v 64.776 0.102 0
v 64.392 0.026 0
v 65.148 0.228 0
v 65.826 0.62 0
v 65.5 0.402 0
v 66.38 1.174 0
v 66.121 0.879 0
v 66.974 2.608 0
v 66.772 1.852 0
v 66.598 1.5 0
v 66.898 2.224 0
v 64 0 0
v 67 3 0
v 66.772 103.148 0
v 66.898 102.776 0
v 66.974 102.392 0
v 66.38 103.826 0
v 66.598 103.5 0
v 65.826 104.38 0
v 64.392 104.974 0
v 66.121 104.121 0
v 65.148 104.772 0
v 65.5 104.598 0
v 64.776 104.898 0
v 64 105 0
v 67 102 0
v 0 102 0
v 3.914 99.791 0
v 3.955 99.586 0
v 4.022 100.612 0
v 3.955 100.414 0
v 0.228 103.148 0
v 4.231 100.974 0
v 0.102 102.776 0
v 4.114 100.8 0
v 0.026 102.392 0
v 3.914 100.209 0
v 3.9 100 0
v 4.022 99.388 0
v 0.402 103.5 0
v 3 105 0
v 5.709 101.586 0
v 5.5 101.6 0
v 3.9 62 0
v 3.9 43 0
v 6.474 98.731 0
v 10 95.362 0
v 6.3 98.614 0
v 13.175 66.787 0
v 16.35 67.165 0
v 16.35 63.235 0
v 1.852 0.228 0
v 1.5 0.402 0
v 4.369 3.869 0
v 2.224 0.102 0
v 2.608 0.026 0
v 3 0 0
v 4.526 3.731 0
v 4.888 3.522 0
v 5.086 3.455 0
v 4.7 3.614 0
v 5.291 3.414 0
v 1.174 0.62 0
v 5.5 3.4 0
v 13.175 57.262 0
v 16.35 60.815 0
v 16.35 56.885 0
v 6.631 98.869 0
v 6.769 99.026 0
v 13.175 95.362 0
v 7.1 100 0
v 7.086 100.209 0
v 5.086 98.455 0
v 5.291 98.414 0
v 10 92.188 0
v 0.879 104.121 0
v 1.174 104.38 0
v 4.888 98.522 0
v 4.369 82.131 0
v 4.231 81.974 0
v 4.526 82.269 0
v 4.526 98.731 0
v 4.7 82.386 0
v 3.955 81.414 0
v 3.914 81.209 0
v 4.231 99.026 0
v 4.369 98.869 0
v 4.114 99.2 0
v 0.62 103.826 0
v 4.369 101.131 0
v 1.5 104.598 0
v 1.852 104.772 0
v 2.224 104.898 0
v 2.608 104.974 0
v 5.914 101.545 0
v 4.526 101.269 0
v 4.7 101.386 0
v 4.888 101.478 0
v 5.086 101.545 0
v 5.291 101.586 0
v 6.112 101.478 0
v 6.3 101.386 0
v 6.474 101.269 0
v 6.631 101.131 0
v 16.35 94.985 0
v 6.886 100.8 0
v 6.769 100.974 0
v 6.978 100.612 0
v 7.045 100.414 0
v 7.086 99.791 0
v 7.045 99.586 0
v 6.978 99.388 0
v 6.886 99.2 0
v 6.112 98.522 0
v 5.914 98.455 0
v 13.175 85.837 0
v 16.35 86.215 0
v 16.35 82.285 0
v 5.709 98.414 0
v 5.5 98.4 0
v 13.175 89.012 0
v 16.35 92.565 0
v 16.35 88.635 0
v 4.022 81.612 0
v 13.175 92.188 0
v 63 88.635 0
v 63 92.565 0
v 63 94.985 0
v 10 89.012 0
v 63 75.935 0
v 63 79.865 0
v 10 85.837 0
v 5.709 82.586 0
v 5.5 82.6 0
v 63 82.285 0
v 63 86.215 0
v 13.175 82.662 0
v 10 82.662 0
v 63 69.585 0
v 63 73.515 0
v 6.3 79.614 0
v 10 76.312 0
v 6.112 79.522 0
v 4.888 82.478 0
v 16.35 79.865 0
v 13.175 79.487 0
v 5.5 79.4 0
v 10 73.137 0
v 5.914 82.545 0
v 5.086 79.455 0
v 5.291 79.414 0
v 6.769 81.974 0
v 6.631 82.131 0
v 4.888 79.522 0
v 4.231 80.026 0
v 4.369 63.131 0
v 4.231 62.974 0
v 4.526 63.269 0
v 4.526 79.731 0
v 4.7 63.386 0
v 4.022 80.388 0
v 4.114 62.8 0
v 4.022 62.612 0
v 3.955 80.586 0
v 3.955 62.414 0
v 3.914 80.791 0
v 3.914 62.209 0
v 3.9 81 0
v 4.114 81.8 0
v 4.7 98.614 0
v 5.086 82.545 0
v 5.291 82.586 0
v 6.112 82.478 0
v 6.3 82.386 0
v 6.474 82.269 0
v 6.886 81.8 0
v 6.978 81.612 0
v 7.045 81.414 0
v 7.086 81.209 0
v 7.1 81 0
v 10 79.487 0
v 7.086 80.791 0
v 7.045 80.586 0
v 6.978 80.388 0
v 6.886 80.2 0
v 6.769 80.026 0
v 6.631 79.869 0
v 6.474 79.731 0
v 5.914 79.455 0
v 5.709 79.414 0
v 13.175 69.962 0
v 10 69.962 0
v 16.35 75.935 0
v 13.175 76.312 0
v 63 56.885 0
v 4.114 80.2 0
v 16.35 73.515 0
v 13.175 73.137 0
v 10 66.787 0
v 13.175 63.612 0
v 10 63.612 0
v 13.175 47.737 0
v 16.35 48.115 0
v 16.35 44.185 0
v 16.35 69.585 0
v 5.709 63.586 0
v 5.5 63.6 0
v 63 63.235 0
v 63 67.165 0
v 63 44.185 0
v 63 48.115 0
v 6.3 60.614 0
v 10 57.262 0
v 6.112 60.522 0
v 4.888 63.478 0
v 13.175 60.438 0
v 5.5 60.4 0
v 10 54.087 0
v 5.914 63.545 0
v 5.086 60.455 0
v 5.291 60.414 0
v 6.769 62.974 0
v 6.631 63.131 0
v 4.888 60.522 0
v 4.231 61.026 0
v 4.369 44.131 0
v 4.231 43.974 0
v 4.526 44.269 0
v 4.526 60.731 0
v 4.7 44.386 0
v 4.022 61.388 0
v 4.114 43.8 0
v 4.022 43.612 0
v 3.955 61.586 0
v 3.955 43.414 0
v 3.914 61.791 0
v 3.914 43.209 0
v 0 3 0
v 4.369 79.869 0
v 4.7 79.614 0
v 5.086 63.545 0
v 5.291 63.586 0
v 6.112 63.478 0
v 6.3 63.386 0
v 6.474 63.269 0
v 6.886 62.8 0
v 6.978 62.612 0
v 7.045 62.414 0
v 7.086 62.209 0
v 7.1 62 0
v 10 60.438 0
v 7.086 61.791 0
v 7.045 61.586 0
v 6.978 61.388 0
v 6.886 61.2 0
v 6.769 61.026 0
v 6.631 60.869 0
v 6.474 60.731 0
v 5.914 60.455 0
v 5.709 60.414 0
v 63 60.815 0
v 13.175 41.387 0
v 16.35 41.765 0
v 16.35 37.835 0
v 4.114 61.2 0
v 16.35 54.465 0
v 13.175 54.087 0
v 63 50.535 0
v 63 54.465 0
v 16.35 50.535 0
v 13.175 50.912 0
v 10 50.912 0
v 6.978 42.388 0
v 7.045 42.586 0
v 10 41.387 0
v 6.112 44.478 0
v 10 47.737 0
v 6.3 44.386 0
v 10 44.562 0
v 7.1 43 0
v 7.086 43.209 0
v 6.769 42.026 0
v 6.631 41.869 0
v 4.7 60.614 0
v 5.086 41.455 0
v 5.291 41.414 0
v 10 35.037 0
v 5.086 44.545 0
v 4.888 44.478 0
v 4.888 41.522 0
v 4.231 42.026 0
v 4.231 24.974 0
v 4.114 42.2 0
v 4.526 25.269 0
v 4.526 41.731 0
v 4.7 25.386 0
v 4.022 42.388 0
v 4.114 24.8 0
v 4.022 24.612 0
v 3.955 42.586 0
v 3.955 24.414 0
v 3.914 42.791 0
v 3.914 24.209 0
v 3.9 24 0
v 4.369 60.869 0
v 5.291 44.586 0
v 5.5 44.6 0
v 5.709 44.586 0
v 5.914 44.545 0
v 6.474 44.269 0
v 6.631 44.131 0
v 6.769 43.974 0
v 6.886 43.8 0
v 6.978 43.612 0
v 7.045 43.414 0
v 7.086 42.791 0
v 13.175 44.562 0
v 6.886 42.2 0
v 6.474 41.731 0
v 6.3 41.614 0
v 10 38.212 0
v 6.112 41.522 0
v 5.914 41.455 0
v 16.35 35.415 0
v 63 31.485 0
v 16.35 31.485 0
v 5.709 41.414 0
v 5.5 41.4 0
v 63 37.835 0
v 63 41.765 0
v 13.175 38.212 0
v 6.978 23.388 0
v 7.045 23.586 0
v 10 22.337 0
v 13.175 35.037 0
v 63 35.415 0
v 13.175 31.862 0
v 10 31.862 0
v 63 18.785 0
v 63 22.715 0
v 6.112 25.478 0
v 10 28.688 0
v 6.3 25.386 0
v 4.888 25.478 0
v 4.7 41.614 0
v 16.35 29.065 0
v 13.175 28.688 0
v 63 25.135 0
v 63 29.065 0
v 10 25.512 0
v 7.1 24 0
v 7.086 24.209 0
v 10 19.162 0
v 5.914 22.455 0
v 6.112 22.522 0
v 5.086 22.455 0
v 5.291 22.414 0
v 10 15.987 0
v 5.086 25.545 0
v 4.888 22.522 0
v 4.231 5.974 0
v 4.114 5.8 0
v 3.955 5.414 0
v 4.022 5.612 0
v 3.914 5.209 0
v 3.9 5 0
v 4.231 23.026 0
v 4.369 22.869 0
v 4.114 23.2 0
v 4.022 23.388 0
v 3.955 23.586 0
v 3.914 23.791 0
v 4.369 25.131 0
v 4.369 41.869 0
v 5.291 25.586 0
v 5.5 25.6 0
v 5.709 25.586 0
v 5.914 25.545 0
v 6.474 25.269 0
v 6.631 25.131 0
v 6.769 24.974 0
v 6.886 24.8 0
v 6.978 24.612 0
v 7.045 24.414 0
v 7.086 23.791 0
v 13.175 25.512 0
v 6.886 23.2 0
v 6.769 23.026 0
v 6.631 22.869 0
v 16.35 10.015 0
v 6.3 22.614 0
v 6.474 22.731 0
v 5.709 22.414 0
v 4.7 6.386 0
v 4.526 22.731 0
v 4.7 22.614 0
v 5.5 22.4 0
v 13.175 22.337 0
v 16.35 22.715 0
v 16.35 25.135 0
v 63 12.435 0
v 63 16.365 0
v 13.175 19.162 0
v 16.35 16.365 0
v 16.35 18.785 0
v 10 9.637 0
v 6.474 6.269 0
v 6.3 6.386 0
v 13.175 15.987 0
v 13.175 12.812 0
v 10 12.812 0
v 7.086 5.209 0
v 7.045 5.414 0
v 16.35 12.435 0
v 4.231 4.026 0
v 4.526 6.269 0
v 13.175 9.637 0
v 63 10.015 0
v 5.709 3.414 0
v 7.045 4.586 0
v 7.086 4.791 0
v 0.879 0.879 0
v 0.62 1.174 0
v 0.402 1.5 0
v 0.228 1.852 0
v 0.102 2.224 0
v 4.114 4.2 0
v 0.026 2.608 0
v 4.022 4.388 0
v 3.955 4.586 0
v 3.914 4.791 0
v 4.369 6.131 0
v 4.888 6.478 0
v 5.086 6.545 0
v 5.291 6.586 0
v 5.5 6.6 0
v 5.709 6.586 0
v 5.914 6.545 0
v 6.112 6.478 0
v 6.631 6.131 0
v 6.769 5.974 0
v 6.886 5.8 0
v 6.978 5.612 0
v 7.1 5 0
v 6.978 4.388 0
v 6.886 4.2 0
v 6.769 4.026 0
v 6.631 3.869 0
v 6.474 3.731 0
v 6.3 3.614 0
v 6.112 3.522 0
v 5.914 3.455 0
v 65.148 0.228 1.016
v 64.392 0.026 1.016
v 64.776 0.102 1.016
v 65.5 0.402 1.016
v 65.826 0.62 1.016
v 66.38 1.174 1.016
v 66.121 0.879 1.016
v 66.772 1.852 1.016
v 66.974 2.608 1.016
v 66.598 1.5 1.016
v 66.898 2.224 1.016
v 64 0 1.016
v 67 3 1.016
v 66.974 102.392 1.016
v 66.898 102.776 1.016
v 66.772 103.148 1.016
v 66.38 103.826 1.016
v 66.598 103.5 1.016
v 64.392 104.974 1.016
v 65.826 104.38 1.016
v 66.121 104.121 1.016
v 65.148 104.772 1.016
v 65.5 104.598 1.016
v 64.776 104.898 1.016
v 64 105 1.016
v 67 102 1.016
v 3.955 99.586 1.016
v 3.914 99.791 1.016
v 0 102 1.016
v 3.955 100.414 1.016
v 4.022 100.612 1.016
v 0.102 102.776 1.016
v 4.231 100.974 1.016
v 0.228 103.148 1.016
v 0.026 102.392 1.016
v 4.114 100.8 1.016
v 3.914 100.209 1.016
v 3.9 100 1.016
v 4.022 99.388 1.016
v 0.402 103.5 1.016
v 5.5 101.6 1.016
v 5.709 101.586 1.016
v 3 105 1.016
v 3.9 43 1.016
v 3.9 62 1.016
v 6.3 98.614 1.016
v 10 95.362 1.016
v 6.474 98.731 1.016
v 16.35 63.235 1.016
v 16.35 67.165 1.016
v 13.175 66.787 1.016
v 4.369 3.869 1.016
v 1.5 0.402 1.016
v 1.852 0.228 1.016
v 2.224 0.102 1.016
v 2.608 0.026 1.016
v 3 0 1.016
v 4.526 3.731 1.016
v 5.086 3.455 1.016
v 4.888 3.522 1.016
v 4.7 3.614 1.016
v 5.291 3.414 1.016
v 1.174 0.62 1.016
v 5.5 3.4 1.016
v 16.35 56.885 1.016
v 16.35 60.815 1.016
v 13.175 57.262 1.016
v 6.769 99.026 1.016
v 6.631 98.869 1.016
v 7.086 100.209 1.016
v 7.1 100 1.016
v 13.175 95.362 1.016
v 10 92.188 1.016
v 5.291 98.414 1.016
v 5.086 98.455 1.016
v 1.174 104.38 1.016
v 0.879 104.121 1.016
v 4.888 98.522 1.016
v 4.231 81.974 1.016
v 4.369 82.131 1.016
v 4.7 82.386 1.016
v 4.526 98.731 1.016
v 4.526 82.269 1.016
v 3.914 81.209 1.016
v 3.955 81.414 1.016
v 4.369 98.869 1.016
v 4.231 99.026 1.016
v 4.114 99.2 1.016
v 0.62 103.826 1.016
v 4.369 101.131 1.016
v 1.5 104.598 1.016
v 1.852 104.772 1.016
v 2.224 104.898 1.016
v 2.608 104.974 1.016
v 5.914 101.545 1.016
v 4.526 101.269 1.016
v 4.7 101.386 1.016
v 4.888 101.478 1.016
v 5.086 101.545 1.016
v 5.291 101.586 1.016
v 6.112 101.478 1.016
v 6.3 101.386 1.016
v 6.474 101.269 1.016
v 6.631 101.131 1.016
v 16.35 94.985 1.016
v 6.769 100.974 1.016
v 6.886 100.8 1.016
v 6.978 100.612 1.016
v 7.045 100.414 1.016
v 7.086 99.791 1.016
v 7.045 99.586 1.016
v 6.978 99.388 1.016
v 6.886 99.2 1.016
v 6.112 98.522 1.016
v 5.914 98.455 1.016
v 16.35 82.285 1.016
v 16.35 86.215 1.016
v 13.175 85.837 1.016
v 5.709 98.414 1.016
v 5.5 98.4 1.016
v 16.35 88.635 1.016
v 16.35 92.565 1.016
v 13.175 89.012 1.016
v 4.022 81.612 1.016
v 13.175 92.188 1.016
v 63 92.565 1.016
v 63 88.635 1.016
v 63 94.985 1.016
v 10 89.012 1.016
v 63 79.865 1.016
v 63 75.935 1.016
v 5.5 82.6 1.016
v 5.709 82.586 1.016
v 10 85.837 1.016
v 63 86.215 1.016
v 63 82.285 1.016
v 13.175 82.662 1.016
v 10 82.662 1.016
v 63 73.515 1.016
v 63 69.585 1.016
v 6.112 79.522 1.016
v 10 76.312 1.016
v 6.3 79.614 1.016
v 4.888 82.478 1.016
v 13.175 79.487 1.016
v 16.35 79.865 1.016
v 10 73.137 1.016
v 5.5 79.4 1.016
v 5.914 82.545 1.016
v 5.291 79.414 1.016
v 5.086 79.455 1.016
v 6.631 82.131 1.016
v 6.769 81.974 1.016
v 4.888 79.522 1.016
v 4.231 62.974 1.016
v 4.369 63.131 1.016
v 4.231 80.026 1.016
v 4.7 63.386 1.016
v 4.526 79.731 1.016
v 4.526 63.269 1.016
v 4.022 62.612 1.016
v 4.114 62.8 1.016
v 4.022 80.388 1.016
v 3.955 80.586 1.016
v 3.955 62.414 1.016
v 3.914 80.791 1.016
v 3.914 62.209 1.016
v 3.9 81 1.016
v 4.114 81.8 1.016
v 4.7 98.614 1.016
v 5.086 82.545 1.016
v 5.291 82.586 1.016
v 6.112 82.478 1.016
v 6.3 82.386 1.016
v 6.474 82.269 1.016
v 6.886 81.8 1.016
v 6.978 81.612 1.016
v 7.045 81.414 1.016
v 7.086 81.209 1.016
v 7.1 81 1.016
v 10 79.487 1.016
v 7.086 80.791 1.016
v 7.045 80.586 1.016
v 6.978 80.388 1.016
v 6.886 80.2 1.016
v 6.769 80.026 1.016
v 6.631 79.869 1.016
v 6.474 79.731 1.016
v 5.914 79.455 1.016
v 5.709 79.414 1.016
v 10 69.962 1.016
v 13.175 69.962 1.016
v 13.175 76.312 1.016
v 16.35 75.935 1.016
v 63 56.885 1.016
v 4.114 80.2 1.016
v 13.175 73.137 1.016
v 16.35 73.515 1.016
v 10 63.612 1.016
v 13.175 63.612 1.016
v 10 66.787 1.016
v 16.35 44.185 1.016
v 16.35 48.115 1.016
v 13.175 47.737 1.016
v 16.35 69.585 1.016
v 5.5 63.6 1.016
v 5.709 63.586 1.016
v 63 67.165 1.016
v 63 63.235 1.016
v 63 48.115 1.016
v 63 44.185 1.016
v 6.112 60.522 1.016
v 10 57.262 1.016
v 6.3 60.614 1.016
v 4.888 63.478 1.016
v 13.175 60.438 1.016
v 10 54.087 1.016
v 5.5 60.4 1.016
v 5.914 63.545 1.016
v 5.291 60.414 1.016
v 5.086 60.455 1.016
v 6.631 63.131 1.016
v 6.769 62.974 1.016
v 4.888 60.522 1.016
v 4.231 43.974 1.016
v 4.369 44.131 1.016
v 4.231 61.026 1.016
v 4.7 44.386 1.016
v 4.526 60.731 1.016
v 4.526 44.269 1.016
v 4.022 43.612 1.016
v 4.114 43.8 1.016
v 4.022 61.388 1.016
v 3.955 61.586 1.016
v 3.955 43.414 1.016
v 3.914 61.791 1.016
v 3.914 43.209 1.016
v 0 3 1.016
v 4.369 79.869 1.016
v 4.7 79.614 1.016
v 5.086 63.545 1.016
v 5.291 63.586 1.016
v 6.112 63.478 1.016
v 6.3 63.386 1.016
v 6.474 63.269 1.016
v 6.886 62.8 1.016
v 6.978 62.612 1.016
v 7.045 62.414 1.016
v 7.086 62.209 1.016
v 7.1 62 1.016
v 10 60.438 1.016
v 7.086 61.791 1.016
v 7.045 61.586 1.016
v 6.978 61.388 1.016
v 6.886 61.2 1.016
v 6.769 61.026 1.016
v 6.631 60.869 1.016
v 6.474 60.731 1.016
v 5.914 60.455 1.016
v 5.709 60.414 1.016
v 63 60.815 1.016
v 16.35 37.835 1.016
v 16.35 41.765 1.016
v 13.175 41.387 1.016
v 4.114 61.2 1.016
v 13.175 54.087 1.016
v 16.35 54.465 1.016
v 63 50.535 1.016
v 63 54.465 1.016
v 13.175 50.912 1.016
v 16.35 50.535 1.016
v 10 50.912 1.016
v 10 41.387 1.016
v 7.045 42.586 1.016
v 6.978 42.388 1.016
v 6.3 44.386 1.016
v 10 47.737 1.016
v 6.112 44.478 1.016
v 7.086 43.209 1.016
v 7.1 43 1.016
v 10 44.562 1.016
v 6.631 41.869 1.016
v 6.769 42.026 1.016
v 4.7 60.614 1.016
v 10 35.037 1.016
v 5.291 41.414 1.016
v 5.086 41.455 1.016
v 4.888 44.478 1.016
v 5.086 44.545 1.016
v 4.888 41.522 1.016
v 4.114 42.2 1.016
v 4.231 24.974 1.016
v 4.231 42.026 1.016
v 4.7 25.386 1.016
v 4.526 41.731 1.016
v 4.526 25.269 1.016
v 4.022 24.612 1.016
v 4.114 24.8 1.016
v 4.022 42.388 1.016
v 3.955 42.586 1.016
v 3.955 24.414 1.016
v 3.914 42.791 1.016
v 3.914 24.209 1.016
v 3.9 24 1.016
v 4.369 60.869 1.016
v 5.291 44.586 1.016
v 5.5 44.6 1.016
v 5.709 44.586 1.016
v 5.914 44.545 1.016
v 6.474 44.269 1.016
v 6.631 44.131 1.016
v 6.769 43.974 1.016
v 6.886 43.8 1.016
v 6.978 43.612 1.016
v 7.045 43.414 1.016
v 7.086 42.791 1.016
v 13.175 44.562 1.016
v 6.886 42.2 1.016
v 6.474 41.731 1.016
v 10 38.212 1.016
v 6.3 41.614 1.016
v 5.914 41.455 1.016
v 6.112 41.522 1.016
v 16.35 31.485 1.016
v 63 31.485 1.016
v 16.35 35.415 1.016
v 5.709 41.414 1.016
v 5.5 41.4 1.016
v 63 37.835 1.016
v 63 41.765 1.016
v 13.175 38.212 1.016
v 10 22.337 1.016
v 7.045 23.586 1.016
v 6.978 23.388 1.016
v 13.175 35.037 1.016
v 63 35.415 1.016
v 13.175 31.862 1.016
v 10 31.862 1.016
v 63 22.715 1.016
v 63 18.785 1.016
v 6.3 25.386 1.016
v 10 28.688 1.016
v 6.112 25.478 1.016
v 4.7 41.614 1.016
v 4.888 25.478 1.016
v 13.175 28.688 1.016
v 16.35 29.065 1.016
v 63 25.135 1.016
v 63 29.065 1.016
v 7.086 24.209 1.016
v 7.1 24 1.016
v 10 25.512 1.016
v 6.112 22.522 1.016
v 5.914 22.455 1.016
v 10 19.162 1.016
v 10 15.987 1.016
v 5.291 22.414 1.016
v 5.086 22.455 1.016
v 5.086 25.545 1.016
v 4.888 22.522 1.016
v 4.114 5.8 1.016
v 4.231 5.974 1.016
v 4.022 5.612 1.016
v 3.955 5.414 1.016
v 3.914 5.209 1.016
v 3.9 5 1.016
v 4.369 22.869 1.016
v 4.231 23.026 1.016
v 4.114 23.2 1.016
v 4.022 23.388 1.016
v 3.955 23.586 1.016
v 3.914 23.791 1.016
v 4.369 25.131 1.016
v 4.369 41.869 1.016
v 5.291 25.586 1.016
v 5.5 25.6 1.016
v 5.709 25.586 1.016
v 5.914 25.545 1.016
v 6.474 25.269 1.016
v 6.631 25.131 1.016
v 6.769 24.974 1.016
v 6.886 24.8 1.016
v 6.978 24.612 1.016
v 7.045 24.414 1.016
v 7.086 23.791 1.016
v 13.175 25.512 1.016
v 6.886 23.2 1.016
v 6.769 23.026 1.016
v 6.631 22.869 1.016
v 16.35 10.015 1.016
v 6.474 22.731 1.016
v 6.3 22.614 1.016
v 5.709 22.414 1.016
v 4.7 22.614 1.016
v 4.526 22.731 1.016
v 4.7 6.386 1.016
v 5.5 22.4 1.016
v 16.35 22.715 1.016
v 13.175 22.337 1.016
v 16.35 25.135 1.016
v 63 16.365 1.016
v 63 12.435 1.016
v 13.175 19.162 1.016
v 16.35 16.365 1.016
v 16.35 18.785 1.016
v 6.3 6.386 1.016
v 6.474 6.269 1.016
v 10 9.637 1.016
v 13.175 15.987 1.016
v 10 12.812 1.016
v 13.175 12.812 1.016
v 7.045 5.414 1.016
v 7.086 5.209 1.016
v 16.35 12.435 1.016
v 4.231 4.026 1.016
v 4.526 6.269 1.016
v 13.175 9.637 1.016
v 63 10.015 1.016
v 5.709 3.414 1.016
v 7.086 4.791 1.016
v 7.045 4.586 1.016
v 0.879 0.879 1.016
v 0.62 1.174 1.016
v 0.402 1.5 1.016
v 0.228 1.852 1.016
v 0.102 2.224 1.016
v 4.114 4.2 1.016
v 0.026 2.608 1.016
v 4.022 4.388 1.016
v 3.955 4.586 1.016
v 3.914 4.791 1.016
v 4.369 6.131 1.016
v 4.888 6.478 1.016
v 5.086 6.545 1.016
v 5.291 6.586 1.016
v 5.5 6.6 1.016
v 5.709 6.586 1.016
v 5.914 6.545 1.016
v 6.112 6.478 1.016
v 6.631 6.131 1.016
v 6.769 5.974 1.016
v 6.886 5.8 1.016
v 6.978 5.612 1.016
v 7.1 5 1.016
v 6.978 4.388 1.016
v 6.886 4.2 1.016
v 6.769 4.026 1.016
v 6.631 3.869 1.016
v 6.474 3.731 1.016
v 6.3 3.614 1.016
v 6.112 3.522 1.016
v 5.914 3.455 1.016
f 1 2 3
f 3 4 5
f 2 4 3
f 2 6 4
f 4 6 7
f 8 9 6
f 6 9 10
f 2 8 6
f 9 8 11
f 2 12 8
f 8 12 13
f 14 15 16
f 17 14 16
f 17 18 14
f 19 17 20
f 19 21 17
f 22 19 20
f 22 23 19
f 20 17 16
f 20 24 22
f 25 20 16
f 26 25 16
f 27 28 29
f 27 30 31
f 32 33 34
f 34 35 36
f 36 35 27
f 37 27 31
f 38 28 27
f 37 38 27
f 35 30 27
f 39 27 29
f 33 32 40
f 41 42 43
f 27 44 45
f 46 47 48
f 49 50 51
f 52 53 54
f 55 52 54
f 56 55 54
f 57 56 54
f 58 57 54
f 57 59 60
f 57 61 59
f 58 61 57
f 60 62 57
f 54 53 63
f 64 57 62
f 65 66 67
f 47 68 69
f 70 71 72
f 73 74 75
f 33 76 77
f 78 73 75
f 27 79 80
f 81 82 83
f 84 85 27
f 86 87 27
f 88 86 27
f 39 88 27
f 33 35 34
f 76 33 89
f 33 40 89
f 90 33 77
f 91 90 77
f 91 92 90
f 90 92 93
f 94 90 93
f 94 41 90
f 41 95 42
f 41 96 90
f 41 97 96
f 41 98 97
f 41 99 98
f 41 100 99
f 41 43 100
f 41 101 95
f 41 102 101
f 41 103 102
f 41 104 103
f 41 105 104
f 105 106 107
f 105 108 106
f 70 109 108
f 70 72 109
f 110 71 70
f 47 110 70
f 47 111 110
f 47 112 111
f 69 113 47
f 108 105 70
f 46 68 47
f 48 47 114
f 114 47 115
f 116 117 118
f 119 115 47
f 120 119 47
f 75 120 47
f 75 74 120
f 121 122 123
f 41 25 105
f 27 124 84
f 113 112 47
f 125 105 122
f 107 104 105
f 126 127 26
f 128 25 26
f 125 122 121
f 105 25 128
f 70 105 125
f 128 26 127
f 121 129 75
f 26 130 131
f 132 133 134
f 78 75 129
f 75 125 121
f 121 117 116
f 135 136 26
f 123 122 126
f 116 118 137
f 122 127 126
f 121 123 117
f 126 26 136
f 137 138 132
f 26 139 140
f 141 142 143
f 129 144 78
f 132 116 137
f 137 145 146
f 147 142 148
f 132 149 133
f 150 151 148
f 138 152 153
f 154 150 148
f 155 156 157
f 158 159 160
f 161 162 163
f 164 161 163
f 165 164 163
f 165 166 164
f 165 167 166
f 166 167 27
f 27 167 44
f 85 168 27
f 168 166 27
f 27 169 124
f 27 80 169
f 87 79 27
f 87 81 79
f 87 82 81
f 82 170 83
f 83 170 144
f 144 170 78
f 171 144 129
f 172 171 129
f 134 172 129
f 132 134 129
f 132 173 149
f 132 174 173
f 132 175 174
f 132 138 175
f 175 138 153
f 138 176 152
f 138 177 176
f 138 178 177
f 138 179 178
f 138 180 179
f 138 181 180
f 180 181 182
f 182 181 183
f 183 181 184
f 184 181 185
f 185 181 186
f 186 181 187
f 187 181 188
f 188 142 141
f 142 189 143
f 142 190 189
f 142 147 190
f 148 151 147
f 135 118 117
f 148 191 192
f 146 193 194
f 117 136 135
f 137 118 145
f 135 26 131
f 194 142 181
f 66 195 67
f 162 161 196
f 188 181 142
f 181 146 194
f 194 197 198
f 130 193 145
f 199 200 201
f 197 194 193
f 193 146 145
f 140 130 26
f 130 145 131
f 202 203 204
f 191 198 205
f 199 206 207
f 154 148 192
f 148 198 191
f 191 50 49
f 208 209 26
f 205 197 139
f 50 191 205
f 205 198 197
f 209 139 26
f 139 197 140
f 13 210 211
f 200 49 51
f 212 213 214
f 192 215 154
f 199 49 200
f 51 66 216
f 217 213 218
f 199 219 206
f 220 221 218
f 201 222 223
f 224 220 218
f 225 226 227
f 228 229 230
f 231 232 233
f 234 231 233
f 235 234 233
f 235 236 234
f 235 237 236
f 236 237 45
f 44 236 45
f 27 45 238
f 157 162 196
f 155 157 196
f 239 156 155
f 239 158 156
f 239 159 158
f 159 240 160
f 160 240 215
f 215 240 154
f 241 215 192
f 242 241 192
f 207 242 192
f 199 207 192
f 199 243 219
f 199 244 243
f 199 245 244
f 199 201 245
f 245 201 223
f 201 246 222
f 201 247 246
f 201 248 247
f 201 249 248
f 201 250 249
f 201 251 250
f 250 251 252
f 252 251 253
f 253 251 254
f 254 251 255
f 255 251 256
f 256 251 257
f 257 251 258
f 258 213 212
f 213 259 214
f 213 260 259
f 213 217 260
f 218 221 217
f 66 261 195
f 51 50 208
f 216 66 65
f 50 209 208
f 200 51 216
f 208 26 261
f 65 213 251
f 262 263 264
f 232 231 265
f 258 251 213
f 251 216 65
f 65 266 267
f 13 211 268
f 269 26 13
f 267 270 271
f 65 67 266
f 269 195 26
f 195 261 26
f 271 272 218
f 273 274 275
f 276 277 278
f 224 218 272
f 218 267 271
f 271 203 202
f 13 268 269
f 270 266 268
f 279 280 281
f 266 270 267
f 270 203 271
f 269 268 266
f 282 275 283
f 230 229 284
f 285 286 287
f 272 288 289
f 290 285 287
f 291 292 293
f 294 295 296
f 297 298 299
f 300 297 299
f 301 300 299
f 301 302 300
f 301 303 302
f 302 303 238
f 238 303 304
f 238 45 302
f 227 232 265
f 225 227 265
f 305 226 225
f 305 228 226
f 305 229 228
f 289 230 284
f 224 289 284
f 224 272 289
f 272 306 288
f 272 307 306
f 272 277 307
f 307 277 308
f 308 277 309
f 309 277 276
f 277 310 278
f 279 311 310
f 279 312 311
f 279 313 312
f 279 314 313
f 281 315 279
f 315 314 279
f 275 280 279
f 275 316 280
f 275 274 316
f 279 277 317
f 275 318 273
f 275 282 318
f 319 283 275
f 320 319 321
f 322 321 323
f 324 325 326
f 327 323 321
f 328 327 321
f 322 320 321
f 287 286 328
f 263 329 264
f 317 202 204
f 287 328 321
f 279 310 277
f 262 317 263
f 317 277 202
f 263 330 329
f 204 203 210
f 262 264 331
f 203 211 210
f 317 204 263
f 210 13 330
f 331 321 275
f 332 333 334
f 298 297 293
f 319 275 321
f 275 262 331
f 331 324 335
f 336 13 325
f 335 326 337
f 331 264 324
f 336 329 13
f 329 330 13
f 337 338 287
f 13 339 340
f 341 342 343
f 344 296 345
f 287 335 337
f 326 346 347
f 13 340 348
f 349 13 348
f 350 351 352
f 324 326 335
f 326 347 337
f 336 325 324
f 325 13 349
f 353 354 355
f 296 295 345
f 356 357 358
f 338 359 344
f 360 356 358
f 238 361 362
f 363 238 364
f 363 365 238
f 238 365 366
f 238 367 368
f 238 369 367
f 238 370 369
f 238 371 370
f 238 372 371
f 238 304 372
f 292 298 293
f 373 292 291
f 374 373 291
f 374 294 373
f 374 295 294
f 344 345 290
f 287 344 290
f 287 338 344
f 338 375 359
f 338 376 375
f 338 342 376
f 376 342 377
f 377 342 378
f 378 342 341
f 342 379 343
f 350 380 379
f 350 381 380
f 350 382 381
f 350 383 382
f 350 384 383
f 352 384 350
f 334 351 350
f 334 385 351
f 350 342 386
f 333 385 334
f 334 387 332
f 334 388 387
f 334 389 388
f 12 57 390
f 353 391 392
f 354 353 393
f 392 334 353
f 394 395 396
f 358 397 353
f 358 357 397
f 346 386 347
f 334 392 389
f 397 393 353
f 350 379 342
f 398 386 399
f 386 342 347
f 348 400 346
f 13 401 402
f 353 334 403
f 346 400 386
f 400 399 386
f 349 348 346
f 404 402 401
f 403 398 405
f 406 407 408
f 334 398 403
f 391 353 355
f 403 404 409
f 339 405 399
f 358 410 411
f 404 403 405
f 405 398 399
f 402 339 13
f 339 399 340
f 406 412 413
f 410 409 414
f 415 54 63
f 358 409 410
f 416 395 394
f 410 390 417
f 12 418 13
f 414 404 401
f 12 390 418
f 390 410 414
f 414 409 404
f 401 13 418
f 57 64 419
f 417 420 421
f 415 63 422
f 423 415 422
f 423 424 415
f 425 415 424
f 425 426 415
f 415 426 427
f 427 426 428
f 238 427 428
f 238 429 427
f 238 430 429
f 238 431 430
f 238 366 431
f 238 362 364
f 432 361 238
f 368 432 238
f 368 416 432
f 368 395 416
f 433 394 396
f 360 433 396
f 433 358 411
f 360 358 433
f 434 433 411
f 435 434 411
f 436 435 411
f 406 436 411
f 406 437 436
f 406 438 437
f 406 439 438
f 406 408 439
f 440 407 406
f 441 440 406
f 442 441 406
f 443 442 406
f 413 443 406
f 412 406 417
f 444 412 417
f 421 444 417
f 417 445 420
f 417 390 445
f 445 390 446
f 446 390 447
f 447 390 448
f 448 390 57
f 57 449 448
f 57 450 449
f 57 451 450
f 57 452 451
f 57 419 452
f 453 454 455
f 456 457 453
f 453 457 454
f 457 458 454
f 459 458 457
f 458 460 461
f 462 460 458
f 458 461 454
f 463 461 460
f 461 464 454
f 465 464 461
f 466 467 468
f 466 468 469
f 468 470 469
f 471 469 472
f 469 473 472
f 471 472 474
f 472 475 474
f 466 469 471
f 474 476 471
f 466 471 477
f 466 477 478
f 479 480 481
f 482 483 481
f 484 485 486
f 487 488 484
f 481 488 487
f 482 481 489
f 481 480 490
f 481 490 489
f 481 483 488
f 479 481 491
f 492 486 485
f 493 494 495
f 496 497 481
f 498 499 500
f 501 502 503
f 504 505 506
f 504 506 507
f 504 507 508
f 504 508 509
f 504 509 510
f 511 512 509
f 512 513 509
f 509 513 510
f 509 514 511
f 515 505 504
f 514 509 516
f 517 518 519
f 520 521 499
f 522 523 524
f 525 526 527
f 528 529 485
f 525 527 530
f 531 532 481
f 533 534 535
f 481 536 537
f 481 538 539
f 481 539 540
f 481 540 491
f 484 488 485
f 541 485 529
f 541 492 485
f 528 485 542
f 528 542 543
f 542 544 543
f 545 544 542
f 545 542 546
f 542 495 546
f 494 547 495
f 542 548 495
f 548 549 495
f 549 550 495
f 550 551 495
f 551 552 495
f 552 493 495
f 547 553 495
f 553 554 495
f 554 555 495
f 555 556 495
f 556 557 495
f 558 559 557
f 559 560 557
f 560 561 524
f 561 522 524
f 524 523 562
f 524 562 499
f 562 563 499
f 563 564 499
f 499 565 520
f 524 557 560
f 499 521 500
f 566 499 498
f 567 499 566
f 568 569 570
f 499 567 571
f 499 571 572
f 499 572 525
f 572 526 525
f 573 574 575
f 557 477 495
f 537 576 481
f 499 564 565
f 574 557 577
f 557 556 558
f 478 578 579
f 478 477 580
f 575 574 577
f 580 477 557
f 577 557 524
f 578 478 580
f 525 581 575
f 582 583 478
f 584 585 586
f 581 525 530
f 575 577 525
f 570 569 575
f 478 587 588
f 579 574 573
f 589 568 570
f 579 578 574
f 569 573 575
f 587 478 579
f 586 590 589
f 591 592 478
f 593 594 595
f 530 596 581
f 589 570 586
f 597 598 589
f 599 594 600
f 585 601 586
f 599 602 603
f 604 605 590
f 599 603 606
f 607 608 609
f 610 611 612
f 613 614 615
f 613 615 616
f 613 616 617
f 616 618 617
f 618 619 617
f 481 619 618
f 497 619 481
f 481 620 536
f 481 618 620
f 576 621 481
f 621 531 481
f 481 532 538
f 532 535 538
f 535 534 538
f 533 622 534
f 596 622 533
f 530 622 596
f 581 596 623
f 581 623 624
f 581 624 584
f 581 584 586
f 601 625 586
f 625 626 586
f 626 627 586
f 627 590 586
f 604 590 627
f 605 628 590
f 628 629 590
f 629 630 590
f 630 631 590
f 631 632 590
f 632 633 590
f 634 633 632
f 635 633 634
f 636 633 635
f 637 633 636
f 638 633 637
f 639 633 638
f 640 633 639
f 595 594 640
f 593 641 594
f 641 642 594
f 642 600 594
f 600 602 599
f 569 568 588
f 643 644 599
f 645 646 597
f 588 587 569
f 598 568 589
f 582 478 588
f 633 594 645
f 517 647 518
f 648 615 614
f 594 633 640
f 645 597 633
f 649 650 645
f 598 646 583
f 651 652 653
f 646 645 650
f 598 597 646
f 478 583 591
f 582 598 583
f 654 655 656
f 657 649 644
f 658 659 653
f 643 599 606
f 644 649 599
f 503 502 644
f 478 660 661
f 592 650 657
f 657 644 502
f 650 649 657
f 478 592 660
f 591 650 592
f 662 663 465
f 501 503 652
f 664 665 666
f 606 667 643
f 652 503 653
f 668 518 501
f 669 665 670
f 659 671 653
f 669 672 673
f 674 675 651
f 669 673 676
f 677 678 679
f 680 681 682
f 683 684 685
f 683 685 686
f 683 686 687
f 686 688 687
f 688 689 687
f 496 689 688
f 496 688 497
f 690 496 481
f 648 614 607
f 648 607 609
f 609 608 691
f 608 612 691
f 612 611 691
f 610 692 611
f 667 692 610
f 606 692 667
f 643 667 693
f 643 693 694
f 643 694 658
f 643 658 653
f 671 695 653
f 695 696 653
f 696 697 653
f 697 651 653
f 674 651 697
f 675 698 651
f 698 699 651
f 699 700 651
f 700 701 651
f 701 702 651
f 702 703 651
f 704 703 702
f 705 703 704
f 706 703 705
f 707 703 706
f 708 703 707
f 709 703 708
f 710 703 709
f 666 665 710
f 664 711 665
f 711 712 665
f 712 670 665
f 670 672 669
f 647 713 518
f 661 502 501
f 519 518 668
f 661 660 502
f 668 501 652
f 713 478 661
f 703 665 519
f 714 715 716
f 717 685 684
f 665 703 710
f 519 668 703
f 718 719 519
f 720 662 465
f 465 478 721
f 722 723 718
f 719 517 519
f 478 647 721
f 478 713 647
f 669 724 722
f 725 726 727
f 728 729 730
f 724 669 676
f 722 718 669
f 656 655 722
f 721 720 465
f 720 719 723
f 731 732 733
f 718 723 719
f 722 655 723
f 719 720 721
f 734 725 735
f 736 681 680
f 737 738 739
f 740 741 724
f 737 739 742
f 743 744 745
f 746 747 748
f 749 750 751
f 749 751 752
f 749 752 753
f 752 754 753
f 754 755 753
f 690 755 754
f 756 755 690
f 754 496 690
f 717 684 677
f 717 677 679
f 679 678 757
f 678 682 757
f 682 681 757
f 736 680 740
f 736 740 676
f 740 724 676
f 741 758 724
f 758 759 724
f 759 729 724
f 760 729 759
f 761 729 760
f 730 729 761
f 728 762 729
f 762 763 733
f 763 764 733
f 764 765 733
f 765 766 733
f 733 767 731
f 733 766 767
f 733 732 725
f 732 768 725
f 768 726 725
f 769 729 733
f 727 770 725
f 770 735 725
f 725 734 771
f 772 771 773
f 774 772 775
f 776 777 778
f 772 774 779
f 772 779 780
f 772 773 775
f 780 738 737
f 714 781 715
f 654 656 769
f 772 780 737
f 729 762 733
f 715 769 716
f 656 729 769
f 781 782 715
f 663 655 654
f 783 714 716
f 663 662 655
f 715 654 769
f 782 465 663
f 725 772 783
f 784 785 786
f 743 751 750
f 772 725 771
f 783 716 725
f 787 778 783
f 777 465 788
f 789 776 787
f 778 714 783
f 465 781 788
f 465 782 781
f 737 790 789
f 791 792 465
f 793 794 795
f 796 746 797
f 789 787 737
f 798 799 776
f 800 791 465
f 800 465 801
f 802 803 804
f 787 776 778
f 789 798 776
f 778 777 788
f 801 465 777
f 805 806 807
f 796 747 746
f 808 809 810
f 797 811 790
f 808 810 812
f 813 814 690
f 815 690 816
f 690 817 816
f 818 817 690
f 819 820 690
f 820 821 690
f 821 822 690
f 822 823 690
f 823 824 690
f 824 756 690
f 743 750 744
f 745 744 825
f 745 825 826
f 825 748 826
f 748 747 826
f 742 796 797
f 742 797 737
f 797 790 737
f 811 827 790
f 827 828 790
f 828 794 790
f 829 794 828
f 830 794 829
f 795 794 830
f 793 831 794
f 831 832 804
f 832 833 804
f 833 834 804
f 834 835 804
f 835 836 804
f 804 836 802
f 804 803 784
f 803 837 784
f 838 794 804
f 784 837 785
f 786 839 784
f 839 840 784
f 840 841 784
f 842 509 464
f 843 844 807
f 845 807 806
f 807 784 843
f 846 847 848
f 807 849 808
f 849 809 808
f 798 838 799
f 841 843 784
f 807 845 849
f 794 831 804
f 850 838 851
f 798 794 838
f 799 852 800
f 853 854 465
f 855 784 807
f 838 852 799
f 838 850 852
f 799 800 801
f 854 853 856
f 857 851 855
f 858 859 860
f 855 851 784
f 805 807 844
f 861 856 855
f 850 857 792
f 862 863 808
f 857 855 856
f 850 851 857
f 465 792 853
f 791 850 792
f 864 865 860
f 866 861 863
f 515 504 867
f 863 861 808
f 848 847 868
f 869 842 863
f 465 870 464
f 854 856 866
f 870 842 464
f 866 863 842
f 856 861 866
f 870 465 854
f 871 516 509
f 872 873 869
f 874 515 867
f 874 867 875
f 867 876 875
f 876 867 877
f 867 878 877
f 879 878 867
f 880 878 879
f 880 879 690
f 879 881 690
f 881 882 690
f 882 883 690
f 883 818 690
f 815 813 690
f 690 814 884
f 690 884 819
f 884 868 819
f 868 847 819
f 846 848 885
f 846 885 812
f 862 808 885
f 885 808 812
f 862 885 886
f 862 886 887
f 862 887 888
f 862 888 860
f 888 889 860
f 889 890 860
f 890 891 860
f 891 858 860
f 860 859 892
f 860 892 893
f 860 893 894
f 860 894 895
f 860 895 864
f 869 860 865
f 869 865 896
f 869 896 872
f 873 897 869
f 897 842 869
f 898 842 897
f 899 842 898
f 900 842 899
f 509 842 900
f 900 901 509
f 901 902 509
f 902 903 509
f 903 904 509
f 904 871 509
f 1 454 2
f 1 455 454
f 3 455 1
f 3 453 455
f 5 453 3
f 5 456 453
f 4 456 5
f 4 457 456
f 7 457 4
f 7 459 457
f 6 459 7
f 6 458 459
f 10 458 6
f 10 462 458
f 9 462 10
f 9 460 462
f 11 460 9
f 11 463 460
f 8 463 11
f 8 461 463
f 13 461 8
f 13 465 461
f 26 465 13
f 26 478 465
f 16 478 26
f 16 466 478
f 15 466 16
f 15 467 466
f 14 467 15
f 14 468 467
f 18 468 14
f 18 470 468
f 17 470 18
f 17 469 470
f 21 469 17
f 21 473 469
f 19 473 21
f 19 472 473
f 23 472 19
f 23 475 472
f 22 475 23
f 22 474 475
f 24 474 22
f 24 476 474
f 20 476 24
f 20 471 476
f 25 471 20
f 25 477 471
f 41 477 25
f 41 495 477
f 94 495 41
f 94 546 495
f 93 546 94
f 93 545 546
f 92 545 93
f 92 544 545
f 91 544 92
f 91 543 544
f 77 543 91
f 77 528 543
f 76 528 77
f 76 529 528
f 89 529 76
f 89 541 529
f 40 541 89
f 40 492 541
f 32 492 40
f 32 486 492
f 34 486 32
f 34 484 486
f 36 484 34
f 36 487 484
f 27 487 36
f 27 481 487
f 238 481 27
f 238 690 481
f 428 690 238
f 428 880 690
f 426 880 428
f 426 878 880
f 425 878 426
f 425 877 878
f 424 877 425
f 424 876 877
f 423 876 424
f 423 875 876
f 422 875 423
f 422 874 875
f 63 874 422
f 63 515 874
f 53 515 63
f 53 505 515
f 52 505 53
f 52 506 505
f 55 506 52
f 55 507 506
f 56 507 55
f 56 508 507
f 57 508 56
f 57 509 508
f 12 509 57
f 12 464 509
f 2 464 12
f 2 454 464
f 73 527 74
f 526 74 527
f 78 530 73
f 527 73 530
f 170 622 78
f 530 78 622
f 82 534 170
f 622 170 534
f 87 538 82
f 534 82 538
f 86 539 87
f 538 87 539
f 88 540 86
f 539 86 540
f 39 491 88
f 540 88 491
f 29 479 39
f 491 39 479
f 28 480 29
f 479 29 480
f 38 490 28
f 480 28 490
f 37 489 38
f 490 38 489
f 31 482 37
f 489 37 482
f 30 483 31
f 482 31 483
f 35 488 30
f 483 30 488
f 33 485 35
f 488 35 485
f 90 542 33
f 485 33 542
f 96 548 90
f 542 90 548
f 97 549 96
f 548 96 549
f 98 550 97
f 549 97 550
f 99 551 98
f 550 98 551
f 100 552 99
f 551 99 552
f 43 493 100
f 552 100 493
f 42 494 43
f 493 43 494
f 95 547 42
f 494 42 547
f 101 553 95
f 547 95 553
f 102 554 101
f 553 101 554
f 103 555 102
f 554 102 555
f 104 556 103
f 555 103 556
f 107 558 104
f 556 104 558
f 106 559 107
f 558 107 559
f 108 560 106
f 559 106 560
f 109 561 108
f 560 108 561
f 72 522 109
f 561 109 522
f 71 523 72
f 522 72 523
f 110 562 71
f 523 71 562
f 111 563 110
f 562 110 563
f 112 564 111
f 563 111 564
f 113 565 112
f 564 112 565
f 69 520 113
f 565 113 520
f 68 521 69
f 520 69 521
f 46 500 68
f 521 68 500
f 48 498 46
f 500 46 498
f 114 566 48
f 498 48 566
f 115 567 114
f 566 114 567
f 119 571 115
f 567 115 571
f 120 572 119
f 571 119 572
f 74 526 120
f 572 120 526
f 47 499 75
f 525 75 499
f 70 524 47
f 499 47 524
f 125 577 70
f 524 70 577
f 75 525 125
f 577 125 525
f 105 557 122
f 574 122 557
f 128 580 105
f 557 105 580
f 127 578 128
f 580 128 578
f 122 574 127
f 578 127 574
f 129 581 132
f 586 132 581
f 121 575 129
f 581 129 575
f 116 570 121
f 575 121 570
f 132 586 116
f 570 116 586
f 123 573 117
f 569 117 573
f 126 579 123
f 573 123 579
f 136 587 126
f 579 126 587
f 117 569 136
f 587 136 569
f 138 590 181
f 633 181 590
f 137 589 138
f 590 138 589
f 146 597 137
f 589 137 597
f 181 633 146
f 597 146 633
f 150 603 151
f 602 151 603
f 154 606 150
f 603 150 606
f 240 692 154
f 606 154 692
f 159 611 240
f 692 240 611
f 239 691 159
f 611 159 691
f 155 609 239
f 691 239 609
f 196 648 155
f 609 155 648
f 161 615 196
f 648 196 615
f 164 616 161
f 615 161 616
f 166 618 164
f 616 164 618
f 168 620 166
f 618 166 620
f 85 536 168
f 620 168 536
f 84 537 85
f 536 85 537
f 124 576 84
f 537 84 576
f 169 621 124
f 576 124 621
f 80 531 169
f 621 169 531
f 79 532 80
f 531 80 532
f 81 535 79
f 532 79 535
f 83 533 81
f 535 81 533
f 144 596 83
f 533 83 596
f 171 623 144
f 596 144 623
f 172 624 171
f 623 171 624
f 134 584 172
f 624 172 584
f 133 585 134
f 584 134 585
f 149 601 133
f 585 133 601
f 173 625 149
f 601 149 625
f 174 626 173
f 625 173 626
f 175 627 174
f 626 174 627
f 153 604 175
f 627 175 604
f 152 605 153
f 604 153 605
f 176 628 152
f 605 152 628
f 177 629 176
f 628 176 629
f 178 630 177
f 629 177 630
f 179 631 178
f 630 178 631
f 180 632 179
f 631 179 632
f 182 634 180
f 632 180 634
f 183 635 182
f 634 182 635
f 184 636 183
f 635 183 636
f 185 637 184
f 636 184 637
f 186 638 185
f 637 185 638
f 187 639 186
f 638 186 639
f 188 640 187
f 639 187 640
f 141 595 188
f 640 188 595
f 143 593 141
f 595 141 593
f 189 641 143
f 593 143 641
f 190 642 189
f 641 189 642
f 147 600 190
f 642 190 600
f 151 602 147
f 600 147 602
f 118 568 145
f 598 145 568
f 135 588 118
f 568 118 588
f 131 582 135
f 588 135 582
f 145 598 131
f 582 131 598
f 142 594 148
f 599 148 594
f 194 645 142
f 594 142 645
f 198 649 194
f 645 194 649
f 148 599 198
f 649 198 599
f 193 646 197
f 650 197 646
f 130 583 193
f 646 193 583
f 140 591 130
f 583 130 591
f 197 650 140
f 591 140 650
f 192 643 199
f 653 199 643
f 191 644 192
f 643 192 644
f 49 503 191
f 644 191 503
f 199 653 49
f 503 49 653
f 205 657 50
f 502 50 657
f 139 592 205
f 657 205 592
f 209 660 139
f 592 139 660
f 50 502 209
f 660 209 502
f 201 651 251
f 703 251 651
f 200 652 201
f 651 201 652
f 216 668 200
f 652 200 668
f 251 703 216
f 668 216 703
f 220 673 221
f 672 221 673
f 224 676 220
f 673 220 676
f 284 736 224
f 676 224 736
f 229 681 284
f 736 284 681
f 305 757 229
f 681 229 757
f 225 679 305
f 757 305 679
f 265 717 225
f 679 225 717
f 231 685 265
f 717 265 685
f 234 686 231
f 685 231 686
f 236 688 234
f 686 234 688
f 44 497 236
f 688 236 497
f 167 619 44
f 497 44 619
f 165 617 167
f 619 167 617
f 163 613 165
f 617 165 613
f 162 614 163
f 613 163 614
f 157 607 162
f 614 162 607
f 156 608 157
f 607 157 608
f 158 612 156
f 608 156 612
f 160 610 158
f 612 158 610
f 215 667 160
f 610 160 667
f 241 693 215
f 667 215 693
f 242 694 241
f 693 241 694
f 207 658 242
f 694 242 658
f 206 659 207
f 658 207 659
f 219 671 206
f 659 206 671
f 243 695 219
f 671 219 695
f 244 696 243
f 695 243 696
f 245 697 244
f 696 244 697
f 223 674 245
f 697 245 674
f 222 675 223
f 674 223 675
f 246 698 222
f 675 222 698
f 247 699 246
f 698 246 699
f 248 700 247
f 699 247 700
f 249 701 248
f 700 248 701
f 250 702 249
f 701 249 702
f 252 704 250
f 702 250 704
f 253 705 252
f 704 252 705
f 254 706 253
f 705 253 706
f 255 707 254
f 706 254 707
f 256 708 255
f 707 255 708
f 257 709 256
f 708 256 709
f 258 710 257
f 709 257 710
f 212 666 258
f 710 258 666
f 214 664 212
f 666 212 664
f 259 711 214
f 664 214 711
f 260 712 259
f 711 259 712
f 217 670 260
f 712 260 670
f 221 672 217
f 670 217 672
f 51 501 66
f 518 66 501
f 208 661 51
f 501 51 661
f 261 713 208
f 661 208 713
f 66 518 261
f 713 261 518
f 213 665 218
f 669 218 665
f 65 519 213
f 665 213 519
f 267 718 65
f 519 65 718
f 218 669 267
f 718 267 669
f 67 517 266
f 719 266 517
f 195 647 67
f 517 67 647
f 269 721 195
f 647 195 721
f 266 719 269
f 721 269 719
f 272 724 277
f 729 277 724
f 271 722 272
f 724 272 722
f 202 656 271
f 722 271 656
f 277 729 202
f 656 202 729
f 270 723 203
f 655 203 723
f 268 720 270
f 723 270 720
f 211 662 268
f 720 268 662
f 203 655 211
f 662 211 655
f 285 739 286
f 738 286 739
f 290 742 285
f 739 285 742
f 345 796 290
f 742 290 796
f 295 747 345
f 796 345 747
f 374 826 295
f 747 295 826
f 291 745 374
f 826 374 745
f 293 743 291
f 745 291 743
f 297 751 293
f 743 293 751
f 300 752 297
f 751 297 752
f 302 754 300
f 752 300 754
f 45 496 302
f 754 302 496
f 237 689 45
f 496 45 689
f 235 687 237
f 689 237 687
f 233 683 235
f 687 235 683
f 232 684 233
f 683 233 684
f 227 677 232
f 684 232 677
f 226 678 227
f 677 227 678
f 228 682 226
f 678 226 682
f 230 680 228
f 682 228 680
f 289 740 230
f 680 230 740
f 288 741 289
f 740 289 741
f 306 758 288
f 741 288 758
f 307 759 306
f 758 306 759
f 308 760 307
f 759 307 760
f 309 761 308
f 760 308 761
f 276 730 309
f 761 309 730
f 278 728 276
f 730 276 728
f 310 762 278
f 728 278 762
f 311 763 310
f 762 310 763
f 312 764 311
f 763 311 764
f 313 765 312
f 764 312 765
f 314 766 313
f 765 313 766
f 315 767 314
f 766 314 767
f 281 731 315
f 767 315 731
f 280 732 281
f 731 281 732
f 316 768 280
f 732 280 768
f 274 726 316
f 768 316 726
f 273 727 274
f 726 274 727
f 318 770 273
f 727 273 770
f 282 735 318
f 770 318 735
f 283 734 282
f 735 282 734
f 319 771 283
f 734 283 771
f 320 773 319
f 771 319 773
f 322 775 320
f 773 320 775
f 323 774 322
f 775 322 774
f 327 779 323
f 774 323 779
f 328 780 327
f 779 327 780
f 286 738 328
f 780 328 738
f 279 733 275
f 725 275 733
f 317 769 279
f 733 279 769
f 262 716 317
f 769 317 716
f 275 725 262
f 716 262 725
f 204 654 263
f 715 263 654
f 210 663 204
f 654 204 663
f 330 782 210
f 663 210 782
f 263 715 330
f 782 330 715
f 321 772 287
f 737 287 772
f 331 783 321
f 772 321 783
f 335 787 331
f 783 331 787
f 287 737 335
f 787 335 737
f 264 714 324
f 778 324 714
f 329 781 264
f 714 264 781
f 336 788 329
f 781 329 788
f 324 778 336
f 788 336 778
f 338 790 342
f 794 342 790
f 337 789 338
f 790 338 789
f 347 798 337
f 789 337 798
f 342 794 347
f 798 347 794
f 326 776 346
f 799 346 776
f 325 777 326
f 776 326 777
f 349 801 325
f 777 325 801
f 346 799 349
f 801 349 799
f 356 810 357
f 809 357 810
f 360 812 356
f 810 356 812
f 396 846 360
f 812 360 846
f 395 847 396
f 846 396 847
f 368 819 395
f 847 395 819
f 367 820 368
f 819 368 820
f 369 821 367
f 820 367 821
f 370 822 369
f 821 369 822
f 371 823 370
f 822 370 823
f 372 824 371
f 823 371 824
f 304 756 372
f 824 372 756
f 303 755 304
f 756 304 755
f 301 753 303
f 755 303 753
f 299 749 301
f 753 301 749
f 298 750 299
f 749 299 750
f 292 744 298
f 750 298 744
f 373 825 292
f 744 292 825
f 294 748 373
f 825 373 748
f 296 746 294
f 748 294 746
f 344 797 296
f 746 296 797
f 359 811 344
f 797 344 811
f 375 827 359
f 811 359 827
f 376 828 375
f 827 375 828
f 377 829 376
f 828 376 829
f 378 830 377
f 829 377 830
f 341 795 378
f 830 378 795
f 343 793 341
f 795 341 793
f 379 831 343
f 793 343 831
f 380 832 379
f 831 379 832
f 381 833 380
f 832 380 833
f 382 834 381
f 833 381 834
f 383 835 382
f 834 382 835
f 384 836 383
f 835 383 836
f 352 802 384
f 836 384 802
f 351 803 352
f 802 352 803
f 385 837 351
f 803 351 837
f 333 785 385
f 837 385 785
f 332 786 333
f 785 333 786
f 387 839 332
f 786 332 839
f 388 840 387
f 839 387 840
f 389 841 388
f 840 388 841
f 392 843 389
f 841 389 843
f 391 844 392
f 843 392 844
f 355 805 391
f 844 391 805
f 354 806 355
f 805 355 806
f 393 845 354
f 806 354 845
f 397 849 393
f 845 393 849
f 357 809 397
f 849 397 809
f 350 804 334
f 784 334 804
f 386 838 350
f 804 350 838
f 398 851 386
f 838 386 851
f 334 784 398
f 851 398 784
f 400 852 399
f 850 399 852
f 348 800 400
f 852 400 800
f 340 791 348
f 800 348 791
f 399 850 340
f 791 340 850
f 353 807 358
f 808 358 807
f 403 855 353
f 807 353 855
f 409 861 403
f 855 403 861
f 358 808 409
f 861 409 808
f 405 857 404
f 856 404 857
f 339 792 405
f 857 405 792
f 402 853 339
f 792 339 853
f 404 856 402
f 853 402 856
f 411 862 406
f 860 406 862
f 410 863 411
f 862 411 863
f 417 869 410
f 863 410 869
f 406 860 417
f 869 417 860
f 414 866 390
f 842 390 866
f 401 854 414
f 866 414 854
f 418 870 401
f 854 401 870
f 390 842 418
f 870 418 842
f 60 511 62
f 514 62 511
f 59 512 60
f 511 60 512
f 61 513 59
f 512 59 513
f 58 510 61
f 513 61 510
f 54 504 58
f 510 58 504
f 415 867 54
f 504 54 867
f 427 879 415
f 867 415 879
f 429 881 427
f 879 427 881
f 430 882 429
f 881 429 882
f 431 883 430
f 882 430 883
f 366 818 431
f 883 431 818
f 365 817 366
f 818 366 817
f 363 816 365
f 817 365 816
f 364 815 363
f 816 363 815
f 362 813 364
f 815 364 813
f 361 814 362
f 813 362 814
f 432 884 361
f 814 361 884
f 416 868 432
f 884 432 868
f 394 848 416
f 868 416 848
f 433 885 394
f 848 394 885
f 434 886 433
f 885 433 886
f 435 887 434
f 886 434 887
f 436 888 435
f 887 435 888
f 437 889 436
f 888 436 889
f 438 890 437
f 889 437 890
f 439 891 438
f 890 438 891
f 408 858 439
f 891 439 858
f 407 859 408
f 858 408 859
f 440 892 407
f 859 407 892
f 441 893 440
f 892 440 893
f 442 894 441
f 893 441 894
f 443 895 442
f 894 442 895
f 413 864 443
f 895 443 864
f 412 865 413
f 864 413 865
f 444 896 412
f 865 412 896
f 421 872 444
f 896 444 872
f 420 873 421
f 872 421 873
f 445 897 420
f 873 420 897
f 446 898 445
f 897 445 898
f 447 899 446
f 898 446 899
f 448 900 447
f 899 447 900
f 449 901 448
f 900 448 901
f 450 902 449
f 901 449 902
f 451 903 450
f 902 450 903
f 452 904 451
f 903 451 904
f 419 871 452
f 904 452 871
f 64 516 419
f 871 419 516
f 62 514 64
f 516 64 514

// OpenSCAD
// Field Notes checklist stencil, adapted to a mini planner page with 6 ring-binder holes.
// Rebuilt parametrically from "field-notes-checklist.stl": the original's dimensions (1.016mm plate,
// 6.35mm row pitch, 3.175mm checkboxes, ~2.4mm lines) are the defaults for the matching parameters.

// ============================================================
// PRINT PROFILE (see PRINTER.md for full slicer profile values)
// ------------------------------------------------------------
// Material:    PLA — thin flat stencil/template, no load, heat or UV exposure
// Nozzle:      0.4mm — 2.4mm line slots and 3.2mm boxes are well above nozzle resolution
// Quality:     0.20mm Standard — thickness is ~1mm, so 0.2mm layers give 5 layers
// Infill:      n/a — 1mm plate is effectively all perimeters/solid layers
// Orientation: flat on the bed; slots and holes are vertical through-cuts
// Overrides:   none
// ============================================================

/* [Page] */
// Page width (mm) — mini planner is about 67
page_width = 67; // [40:0.5:120]
// Page height (mm) — mini planner is about 105; ring holes run along the left edge
page_height = 105; // [60:0.5:200]
// Plate thickness (mm)
plate_thickness = 1.016; // [0.4:0.01:3]
// Outside corner rounding radius (mm), 0 for square corners
corner_radius = 3; // [0:0.5:15]

/* [Checklist] */
// Number of checklist lines
line_count = 14; // [1:1:40]
// Distance between line centers (mm)
row_pitch = 6.35; // [3:0.05:15]
// Checkbox side length (mm)
checkbox_size = 3.175; // [1:0.05:8]
// Line slot height (mm)
line_height = 2.42; // [0.8:0.05:6]
// Distance from the left page edge to the checkboxes (mm); must clear the ring holes
checkbox_left_margin = 10; // [3:0.5:30]
// Gap between a checkbox and its line (mm)
checkbox_line_gap = 3.175; // [1:0.05:10]
// Distance from the right page edge to the end of the lines (mm)
right_margin = 4; // [1:0.5:20]

/* [Ring Binder Holes] */
// Cut the ring-binder holes
holes_enabled = true;
// Number of holes
hole_count = 6; // [2:1:10]
// Hole diameter (mm)
hole_diameter = 3.2; // [1:0.1:10]
// Distance between hole centers (mm)
hole_spacing = 19; // [8:0.5:40]
// Distance from the left page edge to hole centers (mm)
hole_edge_offset = 5.5; // [2:0.25:20]

/* [Hidden] */
$fn = 48;
eps = 0.01;

// Lines are centered vertically as a block
block_height = (line_count - 1) * row_pitch;
first_row_y = (page_height + block_height) / 2;
line_x0 = checkbox_left_margin + checkbox_size + checkbox_line_gap;
line_length = page_width - right_margin - line_x0;
holes_span = (hole_count - 1) * hole_spacing;

assert(line_length > 5, "Lines too short: reduce margins/checkbox size or widen the page");
assert(block_height + line_height <= page_height, "Lines do not fit the page height: reduce line_count or row_pitch");
assert(!holes_enabled || holes_span + hole_diameter <= page_height, "Ring holes do not fit the page height");
assert(!holes_enabled || hole_edge_offset + hole_diameter / 2 < checkbox_left_margin,
       "Ring holes collide with the checkboxes: increase checkbox_left_margin");
assert(!holes_enabled || hole_edge_offset > hole_diameter / 2, "Hole breaks through the page edge");

module outline() {
    if (corner_radius > 0)
        offset(r = corner_radius)
            translate([corner_radius, corner_radius])
                square([page_width - 2 * corner_radius, page_height - 2 * corner_radius]);
    else
        square([page_width, page_height]);
}

module checklist_cuts() {
    for (i = [0 : line_count - 1]) {
        y = first_row_y - i * row_pitch;
        translate([checkbox_left_margin, y - checkbox_size / 2])
            square([checkbox_size, checkbox_size]);
        translate([line_x0, y - line_height / 2])
            square([line_length, line_height]);
    }
}

module ring_holes() {
    if (holes_enabled)
        for (i = [0 : hole_count - 1])
            translate([hole_edge_offset, (page_height - holes_span) / 2 + i * hole_spacing])
                circle(d = hole_diameter);
}

linear_extrude(height = plate_thickness)
    difference() {
        outline();
        checklist_cuts();
        ring_holes();
    }
